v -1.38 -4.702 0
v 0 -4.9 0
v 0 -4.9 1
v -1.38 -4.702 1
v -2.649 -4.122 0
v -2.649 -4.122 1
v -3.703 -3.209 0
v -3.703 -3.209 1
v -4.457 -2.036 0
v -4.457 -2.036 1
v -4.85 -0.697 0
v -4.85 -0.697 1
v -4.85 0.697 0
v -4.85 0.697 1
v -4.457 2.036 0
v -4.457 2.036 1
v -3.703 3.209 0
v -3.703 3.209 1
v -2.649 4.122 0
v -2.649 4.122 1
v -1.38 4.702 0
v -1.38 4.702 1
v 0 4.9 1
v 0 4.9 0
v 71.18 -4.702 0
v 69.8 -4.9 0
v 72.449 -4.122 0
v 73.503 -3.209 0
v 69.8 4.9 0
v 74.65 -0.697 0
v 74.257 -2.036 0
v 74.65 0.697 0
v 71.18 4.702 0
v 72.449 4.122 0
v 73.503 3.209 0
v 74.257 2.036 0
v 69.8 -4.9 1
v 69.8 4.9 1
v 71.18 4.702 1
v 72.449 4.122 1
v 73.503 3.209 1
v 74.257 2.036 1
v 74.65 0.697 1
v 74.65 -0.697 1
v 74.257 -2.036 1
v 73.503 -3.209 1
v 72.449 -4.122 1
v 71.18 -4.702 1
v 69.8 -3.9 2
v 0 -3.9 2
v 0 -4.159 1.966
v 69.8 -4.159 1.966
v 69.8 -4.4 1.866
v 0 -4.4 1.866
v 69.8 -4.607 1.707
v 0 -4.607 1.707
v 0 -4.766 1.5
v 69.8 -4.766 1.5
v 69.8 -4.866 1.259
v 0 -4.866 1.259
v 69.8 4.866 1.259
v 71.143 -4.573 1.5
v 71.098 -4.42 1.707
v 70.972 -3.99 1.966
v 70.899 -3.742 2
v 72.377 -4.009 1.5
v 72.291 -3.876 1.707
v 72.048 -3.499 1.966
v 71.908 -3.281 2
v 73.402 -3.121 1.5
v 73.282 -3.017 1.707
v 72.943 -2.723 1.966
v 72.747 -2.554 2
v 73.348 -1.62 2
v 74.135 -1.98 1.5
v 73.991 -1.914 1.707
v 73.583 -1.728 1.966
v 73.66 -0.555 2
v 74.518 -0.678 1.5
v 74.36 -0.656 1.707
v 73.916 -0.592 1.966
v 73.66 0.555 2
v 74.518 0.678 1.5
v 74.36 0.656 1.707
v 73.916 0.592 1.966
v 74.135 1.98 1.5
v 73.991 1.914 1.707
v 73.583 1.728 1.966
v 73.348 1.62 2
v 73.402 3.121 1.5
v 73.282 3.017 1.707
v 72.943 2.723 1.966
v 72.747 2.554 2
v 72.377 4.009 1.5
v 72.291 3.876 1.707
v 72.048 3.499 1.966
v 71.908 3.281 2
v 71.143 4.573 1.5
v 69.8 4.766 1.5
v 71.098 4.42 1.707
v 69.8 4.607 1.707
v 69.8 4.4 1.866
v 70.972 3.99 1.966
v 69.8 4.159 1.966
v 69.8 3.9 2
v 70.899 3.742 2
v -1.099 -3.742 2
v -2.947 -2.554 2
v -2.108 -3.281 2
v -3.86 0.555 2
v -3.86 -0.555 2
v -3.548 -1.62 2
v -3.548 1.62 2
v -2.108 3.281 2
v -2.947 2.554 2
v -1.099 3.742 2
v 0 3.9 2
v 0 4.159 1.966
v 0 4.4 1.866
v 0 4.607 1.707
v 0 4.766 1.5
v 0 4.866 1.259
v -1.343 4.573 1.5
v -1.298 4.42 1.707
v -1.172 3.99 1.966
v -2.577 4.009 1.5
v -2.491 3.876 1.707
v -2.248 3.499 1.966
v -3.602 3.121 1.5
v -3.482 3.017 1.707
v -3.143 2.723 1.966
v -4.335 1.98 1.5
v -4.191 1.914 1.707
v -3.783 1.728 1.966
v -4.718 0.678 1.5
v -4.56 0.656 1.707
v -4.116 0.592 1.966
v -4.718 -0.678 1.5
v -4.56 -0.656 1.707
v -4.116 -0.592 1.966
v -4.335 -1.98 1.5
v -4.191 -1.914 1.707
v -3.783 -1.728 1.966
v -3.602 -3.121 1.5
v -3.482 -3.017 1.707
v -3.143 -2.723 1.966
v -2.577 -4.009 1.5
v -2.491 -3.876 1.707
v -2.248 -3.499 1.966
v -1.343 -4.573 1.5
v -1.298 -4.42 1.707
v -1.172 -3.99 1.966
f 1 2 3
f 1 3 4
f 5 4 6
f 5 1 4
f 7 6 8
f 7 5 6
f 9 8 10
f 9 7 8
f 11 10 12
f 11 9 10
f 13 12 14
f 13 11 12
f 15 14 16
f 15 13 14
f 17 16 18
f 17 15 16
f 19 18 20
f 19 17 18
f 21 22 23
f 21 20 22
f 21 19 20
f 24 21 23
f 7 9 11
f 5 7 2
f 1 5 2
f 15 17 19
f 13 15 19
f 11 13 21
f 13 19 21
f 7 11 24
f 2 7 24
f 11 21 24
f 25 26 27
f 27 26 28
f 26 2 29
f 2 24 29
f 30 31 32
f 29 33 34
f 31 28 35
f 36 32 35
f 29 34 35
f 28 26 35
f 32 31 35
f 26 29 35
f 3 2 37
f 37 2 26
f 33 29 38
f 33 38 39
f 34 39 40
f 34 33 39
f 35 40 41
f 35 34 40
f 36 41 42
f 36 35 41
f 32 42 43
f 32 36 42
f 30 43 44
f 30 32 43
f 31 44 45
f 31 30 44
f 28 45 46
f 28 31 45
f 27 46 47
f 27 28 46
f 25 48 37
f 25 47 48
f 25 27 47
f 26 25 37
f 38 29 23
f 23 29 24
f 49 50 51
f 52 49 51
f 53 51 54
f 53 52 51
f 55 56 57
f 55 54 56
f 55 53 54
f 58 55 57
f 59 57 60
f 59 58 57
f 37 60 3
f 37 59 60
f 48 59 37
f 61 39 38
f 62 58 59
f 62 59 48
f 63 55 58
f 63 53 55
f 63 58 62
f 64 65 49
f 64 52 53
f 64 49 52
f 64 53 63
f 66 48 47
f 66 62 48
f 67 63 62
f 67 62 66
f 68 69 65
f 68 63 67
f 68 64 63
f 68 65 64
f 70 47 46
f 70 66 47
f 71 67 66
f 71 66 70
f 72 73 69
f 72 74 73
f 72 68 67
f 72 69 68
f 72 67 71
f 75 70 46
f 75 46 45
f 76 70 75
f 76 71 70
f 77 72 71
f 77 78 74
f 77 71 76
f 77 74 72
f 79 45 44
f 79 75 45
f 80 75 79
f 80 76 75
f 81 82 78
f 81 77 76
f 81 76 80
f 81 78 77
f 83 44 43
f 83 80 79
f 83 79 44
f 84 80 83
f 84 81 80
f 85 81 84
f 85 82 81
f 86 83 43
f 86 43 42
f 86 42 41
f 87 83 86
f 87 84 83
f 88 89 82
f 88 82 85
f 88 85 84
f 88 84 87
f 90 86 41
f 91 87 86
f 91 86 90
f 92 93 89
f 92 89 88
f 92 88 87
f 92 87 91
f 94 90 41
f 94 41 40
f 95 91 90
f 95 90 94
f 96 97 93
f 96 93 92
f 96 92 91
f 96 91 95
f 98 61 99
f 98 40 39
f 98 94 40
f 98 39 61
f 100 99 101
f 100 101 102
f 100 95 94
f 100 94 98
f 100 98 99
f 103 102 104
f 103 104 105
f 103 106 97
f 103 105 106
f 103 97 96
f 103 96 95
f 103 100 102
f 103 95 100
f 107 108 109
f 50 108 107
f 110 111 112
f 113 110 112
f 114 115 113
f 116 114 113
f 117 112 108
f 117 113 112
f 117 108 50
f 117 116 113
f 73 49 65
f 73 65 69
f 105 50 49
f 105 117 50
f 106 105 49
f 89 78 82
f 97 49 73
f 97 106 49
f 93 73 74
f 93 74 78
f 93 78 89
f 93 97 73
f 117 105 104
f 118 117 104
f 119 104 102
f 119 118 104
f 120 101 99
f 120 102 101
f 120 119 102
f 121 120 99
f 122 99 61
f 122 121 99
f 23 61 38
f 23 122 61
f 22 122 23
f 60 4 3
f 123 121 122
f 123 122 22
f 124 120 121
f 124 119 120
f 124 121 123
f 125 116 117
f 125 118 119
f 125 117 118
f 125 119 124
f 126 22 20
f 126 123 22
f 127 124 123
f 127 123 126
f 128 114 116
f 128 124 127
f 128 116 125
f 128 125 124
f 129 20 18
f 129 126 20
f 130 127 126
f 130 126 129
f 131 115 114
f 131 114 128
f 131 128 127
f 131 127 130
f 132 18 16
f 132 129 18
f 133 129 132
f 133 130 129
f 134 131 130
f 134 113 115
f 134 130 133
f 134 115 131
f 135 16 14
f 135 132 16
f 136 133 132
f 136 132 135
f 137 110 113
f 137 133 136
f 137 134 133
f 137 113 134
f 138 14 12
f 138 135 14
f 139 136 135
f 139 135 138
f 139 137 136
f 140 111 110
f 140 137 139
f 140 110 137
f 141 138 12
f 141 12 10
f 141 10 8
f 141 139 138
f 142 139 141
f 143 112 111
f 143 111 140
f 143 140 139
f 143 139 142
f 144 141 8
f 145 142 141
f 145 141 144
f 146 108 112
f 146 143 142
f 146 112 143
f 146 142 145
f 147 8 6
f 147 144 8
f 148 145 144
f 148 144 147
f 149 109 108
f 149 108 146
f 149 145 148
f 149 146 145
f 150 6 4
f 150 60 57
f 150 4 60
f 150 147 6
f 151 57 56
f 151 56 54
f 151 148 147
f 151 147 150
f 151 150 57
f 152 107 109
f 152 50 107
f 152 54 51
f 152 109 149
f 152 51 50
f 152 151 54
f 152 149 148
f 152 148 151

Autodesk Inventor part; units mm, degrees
ref_plane "YZ Plane" through (0, 0, 0) normal (1, 0, 0) x (0, 1, 0)
ref_plane "XZ Plane" through (0, 0, 0) normal (0, 1, 0) x (-1, 0, 0)
ref_plane "XY Plane" through (0, 0, 0) normal (0, 0, 1) x (1, 0, 0)
sketch "Sketch1" plane through (0, 0, 0) normal (0, 0, 1) x (1, 0, 0)
  line L0 (0, 0) -> (69.8, 0) construction
  line L1 (0, -4.9) -> (69.8, -4.9)
  line L2 (69.8, 4.9) -> (0, 4.9)
  arc A0 (0, 4.9) -> (0, -4.9) centre (0, 0) ccw
  arc A1 (69.8, -4.9) -> (69.8, 4.9) centre (69.8, 0) ccw
  point P0 (34.9, 0)
  dimension "d0" = 69.8
  dimension "d1" = 9.8
extrude "Extrusion1" add sketch "Sketch1" along normal blind 2
fillet "Fillet1" radius 1 4 edges at (-4.9, 0, 2) (34.9, -4.9, 2) (74.7, 0, 2) (34.9, 4.9, 2)
properties part number "foot"
